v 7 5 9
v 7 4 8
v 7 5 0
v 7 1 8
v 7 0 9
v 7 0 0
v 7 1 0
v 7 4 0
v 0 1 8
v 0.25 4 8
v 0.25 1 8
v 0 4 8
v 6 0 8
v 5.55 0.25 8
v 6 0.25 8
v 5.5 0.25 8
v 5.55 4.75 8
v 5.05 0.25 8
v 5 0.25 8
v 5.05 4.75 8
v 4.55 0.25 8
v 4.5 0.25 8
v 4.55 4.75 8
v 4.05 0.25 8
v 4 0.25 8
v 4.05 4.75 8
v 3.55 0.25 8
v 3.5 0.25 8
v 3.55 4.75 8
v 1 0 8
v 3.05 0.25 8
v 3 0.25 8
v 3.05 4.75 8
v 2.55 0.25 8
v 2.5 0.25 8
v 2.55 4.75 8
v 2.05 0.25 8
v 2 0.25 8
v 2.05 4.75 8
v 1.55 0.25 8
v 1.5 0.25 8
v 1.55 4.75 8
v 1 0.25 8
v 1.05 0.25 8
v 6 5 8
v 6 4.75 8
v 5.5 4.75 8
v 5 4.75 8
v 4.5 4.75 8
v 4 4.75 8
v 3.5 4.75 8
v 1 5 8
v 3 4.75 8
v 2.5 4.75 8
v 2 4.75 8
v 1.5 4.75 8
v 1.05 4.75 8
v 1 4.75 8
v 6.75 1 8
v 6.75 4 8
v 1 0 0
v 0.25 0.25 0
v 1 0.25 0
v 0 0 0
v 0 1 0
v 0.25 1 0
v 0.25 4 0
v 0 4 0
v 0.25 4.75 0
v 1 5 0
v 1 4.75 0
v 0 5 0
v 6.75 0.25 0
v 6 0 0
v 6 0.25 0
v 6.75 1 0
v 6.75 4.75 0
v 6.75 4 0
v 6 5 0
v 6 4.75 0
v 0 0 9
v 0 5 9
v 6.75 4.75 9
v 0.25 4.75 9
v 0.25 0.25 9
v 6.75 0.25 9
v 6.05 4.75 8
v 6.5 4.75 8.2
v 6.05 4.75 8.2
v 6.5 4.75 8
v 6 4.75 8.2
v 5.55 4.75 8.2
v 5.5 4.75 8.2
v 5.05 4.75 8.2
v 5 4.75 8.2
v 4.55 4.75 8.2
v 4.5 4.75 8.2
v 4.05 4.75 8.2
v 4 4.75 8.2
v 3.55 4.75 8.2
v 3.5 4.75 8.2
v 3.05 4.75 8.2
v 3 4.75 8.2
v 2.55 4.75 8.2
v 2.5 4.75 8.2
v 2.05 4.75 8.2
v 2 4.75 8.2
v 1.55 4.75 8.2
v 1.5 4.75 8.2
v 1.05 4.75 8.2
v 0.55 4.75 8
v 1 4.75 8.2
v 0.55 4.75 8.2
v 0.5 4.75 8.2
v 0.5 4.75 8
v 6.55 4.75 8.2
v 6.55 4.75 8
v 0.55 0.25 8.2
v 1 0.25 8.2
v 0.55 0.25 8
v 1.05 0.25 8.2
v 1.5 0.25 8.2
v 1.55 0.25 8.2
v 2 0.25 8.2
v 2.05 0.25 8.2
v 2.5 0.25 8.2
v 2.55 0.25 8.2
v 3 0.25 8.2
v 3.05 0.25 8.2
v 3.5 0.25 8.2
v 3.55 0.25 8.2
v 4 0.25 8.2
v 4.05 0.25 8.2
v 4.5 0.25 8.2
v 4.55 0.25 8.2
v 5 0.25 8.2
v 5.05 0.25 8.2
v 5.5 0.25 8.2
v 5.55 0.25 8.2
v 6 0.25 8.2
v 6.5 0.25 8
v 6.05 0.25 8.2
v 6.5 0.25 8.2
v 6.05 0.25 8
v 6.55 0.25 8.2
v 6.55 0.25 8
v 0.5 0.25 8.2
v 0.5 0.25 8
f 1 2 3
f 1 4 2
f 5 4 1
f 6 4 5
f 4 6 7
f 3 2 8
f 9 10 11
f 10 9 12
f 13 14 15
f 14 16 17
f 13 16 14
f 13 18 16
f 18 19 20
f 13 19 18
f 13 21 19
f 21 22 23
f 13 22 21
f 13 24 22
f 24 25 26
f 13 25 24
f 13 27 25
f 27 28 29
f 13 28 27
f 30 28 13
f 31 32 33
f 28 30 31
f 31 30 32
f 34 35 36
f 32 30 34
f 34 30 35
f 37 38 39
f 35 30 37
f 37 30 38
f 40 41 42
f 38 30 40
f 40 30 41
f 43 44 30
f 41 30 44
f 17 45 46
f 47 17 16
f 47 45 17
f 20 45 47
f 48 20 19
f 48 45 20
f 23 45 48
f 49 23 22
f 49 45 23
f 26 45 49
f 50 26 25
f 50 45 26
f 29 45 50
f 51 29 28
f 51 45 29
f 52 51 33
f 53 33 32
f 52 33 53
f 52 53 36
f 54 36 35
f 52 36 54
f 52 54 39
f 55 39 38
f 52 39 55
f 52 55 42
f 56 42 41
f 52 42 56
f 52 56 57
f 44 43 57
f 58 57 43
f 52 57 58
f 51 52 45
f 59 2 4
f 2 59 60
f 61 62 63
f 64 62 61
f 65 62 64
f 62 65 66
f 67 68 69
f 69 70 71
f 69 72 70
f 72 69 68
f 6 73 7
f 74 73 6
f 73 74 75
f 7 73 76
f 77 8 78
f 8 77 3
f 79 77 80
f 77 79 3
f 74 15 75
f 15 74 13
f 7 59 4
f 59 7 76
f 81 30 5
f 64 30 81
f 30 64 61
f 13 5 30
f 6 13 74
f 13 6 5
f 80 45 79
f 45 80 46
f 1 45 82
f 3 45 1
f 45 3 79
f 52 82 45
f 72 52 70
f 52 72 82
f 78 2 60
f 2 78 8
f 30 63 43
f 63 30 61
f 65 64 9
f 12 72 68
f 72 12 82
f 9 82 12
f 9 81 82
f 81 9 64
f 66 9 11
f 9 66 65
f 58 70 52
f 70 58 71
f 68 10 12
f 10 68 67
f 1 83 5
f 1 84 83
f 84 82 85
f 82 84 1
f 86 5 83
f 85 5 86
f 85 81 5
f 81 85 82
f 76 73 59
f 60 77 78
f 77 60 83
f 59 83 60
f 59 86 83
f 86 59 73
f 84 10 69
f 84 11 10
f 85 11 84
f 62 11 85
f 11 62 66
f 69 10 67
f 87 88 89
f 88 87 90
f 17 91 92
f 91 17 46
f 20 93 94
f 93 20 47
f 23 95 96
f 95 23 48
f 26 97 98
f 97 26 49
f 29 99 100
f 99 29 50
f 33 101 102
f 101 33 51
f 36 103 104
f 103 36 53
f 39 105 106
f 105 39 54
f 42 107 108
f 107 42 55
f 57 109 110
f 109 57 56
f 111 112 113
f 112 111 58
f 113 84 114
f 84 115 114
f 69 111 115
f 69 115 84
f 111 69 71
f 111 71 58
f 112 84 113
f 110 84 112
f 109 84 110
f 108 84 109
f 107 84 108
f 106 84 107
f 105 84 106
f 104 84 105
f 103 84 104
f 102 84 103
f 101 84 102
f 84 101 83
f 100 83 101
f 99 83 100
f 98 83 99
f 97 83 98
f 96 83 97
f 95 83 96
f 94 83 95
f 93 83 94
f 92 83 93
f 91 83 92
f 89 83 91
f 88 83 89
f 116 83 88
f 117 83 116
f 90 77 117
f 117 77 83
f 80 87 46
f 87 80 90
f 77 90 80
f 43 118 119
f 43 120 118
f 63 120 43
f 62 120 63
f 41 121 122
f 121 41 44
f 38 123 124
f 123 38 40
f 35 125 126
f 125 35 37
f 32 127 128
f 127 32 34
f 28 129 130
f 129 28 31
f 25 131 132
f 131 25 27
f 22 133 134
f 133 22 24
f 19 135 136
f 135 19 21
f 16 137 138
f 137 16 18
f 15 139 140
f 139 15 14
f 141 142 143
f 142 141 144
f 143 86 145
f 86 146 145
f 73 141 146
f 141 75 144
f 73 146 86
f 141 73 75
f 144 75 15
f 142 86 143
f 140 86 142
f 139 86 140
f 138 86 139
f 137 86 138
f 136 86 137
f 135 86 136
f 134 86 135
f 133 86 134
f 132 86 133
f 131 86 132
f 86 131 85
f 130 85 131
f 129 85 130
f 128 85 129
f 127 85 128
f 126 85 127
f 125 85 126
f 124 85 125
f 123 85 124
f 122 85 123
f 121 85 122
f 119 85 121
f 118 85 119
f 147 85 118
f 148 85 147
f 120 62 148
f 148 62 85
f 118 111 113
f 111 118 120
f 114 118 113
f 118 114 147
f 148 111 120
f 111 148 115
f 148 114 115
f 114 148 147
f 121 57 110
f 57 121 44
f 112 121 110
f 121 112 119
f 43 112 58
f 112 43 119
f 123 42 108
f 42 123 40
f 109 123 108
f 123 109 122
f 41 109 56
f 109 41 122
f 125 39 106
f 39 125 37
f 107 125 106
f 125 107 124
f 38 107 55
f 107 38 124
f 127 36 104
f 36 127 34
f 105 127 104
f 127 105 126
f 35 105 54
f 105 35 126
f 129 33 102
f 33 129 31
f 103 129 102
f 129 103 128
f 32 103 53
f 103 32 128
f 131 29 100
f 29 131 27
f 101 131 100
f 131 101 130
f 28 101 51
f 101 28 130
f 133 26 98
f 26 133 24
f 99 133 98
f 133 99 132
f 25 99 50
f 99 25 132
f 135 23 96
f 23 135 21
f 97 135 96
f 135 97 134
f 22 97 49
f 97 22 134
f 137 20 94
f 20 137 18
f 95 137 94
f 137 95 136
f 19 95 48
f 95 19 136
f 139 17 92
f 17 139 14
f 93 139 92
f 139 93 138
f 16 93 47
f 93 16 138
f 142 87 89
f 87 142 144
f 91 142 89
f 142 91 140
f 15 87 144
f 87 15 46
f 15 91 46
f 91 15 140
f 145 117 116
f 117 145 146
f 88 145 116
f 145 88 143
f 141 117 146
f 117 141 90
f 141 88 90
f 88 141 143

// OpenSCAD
// Generated by SolidPython 1.0.4 on 2021-04-02 16:09:24


union() {
	difference() {
		union() {
			translate(v = [0, 0, 8]) {
				cube(size = [7, 5, 1]);
			}
			union() {
				cube(size = [1, 1, 8]);
				translate(v = [0, 4, 0]) {
					cube(size = [1, 1, 8]);
				}
				translate(v = [6, 0, 0]) {
					union() {
						cube(size = [1, 1, 8]);
						translate(v = [0, 4, 0]) {
							cube(size = [1, 1, 8]);
						}
					}
				}
			}
		}
		translate(v = [0.2500000000, 0.2500000000, 0]) {
			cube(size = [6.5000000000, 4.5000000000, 9]);
		}
	}
	translate(v = [0.0000000000, 0, 0]) {
		translate(v = [0, 0, 8]) {
			cube(size = [0.0500000000, 5, 0.2000000000]);
		}
	}
	translate(v = [0.5000000000, 0, 0]) {
		translate(v = [0, 0, 8]) {
			cube(size = [0.0500000000, 5, 0.2000000000]);
		}
	}
	translate(v = [1.0000000000, 0, 0]) {
		translate(v = [0, 0, 8]) {
			cube(size = [0.0500000000, 5, 0.2000000000]);
		}
	}
	translate(v = [1.5000000000, 0, 0]) {
		translate(v = [0, 0, 8]) {
			cube(size = [0.0500000000, 5, 0.2000000000]);
		}
	}
	translate(v = [2.0000000000, 0, 0]) {
		translate(v = [0, 0, 8]) {
			cube(size = [0.0500000000, 5, 0.2000000000]);
		}
	}
	translate(v = [2.5000000000, 0, 0]) {
		translate(v = [0, 0, 8]) {
			cube(size = [0.0500000000, 5, 0.2000000000]);
		}
	}
	translate(v = [3.0000000000, 0, 0]) {
		translate(v = [0, 0, 8]) {
			cube(size = [0.0500000000, 5, 0.2000000000]);
		}
	}
	translate(v = [3.5000000000, 0, 0]) {
		translate(v = [0, 0, 8]) {
			cube(size = [0.0500000000, 5, 0.2000000000]);
		}
	}
	translate(v = [4.0000000000, 0, 0]) {
		translate(v = [0, 0, 8]) {
			cube(size = [0.0500000000, 5, 0.2000000000]);
		}
	}
	translate(v = [4.5000000000, 0, 0]) {
		translate(v = [0, 0, 8]) {
			cube(size = [0.0500000000, 5, 0.2000000000]);
		}
	}
	translate(v = [5.0000000000, 0, 0]) {
		translate(v = [0, 0, 8]) {
			cube(size = [0.0500000000, 5, 0.2000000000]);
		}
	}
	translate(v = [5.5000000000, 0, 0]) {
		translate(v = [0, 0, 8]) {
			cube(size = [0.0500000000, 5, 0.2000000000]);
		}
	}
	translate(v = [6.0000000000, 0, 0]) {
		translate(v = [0, 0, 8]) {
			cube(size = [0.0500000000, 5, 0.2000000000]);
		}
	}
	translate(v = [6.5000000000, 0, 0]) {
		translate(v = [0, 0, 8]) {
			cube(size = [0.0500000000, 5, 0.2000000000]);
		}
	}
}
